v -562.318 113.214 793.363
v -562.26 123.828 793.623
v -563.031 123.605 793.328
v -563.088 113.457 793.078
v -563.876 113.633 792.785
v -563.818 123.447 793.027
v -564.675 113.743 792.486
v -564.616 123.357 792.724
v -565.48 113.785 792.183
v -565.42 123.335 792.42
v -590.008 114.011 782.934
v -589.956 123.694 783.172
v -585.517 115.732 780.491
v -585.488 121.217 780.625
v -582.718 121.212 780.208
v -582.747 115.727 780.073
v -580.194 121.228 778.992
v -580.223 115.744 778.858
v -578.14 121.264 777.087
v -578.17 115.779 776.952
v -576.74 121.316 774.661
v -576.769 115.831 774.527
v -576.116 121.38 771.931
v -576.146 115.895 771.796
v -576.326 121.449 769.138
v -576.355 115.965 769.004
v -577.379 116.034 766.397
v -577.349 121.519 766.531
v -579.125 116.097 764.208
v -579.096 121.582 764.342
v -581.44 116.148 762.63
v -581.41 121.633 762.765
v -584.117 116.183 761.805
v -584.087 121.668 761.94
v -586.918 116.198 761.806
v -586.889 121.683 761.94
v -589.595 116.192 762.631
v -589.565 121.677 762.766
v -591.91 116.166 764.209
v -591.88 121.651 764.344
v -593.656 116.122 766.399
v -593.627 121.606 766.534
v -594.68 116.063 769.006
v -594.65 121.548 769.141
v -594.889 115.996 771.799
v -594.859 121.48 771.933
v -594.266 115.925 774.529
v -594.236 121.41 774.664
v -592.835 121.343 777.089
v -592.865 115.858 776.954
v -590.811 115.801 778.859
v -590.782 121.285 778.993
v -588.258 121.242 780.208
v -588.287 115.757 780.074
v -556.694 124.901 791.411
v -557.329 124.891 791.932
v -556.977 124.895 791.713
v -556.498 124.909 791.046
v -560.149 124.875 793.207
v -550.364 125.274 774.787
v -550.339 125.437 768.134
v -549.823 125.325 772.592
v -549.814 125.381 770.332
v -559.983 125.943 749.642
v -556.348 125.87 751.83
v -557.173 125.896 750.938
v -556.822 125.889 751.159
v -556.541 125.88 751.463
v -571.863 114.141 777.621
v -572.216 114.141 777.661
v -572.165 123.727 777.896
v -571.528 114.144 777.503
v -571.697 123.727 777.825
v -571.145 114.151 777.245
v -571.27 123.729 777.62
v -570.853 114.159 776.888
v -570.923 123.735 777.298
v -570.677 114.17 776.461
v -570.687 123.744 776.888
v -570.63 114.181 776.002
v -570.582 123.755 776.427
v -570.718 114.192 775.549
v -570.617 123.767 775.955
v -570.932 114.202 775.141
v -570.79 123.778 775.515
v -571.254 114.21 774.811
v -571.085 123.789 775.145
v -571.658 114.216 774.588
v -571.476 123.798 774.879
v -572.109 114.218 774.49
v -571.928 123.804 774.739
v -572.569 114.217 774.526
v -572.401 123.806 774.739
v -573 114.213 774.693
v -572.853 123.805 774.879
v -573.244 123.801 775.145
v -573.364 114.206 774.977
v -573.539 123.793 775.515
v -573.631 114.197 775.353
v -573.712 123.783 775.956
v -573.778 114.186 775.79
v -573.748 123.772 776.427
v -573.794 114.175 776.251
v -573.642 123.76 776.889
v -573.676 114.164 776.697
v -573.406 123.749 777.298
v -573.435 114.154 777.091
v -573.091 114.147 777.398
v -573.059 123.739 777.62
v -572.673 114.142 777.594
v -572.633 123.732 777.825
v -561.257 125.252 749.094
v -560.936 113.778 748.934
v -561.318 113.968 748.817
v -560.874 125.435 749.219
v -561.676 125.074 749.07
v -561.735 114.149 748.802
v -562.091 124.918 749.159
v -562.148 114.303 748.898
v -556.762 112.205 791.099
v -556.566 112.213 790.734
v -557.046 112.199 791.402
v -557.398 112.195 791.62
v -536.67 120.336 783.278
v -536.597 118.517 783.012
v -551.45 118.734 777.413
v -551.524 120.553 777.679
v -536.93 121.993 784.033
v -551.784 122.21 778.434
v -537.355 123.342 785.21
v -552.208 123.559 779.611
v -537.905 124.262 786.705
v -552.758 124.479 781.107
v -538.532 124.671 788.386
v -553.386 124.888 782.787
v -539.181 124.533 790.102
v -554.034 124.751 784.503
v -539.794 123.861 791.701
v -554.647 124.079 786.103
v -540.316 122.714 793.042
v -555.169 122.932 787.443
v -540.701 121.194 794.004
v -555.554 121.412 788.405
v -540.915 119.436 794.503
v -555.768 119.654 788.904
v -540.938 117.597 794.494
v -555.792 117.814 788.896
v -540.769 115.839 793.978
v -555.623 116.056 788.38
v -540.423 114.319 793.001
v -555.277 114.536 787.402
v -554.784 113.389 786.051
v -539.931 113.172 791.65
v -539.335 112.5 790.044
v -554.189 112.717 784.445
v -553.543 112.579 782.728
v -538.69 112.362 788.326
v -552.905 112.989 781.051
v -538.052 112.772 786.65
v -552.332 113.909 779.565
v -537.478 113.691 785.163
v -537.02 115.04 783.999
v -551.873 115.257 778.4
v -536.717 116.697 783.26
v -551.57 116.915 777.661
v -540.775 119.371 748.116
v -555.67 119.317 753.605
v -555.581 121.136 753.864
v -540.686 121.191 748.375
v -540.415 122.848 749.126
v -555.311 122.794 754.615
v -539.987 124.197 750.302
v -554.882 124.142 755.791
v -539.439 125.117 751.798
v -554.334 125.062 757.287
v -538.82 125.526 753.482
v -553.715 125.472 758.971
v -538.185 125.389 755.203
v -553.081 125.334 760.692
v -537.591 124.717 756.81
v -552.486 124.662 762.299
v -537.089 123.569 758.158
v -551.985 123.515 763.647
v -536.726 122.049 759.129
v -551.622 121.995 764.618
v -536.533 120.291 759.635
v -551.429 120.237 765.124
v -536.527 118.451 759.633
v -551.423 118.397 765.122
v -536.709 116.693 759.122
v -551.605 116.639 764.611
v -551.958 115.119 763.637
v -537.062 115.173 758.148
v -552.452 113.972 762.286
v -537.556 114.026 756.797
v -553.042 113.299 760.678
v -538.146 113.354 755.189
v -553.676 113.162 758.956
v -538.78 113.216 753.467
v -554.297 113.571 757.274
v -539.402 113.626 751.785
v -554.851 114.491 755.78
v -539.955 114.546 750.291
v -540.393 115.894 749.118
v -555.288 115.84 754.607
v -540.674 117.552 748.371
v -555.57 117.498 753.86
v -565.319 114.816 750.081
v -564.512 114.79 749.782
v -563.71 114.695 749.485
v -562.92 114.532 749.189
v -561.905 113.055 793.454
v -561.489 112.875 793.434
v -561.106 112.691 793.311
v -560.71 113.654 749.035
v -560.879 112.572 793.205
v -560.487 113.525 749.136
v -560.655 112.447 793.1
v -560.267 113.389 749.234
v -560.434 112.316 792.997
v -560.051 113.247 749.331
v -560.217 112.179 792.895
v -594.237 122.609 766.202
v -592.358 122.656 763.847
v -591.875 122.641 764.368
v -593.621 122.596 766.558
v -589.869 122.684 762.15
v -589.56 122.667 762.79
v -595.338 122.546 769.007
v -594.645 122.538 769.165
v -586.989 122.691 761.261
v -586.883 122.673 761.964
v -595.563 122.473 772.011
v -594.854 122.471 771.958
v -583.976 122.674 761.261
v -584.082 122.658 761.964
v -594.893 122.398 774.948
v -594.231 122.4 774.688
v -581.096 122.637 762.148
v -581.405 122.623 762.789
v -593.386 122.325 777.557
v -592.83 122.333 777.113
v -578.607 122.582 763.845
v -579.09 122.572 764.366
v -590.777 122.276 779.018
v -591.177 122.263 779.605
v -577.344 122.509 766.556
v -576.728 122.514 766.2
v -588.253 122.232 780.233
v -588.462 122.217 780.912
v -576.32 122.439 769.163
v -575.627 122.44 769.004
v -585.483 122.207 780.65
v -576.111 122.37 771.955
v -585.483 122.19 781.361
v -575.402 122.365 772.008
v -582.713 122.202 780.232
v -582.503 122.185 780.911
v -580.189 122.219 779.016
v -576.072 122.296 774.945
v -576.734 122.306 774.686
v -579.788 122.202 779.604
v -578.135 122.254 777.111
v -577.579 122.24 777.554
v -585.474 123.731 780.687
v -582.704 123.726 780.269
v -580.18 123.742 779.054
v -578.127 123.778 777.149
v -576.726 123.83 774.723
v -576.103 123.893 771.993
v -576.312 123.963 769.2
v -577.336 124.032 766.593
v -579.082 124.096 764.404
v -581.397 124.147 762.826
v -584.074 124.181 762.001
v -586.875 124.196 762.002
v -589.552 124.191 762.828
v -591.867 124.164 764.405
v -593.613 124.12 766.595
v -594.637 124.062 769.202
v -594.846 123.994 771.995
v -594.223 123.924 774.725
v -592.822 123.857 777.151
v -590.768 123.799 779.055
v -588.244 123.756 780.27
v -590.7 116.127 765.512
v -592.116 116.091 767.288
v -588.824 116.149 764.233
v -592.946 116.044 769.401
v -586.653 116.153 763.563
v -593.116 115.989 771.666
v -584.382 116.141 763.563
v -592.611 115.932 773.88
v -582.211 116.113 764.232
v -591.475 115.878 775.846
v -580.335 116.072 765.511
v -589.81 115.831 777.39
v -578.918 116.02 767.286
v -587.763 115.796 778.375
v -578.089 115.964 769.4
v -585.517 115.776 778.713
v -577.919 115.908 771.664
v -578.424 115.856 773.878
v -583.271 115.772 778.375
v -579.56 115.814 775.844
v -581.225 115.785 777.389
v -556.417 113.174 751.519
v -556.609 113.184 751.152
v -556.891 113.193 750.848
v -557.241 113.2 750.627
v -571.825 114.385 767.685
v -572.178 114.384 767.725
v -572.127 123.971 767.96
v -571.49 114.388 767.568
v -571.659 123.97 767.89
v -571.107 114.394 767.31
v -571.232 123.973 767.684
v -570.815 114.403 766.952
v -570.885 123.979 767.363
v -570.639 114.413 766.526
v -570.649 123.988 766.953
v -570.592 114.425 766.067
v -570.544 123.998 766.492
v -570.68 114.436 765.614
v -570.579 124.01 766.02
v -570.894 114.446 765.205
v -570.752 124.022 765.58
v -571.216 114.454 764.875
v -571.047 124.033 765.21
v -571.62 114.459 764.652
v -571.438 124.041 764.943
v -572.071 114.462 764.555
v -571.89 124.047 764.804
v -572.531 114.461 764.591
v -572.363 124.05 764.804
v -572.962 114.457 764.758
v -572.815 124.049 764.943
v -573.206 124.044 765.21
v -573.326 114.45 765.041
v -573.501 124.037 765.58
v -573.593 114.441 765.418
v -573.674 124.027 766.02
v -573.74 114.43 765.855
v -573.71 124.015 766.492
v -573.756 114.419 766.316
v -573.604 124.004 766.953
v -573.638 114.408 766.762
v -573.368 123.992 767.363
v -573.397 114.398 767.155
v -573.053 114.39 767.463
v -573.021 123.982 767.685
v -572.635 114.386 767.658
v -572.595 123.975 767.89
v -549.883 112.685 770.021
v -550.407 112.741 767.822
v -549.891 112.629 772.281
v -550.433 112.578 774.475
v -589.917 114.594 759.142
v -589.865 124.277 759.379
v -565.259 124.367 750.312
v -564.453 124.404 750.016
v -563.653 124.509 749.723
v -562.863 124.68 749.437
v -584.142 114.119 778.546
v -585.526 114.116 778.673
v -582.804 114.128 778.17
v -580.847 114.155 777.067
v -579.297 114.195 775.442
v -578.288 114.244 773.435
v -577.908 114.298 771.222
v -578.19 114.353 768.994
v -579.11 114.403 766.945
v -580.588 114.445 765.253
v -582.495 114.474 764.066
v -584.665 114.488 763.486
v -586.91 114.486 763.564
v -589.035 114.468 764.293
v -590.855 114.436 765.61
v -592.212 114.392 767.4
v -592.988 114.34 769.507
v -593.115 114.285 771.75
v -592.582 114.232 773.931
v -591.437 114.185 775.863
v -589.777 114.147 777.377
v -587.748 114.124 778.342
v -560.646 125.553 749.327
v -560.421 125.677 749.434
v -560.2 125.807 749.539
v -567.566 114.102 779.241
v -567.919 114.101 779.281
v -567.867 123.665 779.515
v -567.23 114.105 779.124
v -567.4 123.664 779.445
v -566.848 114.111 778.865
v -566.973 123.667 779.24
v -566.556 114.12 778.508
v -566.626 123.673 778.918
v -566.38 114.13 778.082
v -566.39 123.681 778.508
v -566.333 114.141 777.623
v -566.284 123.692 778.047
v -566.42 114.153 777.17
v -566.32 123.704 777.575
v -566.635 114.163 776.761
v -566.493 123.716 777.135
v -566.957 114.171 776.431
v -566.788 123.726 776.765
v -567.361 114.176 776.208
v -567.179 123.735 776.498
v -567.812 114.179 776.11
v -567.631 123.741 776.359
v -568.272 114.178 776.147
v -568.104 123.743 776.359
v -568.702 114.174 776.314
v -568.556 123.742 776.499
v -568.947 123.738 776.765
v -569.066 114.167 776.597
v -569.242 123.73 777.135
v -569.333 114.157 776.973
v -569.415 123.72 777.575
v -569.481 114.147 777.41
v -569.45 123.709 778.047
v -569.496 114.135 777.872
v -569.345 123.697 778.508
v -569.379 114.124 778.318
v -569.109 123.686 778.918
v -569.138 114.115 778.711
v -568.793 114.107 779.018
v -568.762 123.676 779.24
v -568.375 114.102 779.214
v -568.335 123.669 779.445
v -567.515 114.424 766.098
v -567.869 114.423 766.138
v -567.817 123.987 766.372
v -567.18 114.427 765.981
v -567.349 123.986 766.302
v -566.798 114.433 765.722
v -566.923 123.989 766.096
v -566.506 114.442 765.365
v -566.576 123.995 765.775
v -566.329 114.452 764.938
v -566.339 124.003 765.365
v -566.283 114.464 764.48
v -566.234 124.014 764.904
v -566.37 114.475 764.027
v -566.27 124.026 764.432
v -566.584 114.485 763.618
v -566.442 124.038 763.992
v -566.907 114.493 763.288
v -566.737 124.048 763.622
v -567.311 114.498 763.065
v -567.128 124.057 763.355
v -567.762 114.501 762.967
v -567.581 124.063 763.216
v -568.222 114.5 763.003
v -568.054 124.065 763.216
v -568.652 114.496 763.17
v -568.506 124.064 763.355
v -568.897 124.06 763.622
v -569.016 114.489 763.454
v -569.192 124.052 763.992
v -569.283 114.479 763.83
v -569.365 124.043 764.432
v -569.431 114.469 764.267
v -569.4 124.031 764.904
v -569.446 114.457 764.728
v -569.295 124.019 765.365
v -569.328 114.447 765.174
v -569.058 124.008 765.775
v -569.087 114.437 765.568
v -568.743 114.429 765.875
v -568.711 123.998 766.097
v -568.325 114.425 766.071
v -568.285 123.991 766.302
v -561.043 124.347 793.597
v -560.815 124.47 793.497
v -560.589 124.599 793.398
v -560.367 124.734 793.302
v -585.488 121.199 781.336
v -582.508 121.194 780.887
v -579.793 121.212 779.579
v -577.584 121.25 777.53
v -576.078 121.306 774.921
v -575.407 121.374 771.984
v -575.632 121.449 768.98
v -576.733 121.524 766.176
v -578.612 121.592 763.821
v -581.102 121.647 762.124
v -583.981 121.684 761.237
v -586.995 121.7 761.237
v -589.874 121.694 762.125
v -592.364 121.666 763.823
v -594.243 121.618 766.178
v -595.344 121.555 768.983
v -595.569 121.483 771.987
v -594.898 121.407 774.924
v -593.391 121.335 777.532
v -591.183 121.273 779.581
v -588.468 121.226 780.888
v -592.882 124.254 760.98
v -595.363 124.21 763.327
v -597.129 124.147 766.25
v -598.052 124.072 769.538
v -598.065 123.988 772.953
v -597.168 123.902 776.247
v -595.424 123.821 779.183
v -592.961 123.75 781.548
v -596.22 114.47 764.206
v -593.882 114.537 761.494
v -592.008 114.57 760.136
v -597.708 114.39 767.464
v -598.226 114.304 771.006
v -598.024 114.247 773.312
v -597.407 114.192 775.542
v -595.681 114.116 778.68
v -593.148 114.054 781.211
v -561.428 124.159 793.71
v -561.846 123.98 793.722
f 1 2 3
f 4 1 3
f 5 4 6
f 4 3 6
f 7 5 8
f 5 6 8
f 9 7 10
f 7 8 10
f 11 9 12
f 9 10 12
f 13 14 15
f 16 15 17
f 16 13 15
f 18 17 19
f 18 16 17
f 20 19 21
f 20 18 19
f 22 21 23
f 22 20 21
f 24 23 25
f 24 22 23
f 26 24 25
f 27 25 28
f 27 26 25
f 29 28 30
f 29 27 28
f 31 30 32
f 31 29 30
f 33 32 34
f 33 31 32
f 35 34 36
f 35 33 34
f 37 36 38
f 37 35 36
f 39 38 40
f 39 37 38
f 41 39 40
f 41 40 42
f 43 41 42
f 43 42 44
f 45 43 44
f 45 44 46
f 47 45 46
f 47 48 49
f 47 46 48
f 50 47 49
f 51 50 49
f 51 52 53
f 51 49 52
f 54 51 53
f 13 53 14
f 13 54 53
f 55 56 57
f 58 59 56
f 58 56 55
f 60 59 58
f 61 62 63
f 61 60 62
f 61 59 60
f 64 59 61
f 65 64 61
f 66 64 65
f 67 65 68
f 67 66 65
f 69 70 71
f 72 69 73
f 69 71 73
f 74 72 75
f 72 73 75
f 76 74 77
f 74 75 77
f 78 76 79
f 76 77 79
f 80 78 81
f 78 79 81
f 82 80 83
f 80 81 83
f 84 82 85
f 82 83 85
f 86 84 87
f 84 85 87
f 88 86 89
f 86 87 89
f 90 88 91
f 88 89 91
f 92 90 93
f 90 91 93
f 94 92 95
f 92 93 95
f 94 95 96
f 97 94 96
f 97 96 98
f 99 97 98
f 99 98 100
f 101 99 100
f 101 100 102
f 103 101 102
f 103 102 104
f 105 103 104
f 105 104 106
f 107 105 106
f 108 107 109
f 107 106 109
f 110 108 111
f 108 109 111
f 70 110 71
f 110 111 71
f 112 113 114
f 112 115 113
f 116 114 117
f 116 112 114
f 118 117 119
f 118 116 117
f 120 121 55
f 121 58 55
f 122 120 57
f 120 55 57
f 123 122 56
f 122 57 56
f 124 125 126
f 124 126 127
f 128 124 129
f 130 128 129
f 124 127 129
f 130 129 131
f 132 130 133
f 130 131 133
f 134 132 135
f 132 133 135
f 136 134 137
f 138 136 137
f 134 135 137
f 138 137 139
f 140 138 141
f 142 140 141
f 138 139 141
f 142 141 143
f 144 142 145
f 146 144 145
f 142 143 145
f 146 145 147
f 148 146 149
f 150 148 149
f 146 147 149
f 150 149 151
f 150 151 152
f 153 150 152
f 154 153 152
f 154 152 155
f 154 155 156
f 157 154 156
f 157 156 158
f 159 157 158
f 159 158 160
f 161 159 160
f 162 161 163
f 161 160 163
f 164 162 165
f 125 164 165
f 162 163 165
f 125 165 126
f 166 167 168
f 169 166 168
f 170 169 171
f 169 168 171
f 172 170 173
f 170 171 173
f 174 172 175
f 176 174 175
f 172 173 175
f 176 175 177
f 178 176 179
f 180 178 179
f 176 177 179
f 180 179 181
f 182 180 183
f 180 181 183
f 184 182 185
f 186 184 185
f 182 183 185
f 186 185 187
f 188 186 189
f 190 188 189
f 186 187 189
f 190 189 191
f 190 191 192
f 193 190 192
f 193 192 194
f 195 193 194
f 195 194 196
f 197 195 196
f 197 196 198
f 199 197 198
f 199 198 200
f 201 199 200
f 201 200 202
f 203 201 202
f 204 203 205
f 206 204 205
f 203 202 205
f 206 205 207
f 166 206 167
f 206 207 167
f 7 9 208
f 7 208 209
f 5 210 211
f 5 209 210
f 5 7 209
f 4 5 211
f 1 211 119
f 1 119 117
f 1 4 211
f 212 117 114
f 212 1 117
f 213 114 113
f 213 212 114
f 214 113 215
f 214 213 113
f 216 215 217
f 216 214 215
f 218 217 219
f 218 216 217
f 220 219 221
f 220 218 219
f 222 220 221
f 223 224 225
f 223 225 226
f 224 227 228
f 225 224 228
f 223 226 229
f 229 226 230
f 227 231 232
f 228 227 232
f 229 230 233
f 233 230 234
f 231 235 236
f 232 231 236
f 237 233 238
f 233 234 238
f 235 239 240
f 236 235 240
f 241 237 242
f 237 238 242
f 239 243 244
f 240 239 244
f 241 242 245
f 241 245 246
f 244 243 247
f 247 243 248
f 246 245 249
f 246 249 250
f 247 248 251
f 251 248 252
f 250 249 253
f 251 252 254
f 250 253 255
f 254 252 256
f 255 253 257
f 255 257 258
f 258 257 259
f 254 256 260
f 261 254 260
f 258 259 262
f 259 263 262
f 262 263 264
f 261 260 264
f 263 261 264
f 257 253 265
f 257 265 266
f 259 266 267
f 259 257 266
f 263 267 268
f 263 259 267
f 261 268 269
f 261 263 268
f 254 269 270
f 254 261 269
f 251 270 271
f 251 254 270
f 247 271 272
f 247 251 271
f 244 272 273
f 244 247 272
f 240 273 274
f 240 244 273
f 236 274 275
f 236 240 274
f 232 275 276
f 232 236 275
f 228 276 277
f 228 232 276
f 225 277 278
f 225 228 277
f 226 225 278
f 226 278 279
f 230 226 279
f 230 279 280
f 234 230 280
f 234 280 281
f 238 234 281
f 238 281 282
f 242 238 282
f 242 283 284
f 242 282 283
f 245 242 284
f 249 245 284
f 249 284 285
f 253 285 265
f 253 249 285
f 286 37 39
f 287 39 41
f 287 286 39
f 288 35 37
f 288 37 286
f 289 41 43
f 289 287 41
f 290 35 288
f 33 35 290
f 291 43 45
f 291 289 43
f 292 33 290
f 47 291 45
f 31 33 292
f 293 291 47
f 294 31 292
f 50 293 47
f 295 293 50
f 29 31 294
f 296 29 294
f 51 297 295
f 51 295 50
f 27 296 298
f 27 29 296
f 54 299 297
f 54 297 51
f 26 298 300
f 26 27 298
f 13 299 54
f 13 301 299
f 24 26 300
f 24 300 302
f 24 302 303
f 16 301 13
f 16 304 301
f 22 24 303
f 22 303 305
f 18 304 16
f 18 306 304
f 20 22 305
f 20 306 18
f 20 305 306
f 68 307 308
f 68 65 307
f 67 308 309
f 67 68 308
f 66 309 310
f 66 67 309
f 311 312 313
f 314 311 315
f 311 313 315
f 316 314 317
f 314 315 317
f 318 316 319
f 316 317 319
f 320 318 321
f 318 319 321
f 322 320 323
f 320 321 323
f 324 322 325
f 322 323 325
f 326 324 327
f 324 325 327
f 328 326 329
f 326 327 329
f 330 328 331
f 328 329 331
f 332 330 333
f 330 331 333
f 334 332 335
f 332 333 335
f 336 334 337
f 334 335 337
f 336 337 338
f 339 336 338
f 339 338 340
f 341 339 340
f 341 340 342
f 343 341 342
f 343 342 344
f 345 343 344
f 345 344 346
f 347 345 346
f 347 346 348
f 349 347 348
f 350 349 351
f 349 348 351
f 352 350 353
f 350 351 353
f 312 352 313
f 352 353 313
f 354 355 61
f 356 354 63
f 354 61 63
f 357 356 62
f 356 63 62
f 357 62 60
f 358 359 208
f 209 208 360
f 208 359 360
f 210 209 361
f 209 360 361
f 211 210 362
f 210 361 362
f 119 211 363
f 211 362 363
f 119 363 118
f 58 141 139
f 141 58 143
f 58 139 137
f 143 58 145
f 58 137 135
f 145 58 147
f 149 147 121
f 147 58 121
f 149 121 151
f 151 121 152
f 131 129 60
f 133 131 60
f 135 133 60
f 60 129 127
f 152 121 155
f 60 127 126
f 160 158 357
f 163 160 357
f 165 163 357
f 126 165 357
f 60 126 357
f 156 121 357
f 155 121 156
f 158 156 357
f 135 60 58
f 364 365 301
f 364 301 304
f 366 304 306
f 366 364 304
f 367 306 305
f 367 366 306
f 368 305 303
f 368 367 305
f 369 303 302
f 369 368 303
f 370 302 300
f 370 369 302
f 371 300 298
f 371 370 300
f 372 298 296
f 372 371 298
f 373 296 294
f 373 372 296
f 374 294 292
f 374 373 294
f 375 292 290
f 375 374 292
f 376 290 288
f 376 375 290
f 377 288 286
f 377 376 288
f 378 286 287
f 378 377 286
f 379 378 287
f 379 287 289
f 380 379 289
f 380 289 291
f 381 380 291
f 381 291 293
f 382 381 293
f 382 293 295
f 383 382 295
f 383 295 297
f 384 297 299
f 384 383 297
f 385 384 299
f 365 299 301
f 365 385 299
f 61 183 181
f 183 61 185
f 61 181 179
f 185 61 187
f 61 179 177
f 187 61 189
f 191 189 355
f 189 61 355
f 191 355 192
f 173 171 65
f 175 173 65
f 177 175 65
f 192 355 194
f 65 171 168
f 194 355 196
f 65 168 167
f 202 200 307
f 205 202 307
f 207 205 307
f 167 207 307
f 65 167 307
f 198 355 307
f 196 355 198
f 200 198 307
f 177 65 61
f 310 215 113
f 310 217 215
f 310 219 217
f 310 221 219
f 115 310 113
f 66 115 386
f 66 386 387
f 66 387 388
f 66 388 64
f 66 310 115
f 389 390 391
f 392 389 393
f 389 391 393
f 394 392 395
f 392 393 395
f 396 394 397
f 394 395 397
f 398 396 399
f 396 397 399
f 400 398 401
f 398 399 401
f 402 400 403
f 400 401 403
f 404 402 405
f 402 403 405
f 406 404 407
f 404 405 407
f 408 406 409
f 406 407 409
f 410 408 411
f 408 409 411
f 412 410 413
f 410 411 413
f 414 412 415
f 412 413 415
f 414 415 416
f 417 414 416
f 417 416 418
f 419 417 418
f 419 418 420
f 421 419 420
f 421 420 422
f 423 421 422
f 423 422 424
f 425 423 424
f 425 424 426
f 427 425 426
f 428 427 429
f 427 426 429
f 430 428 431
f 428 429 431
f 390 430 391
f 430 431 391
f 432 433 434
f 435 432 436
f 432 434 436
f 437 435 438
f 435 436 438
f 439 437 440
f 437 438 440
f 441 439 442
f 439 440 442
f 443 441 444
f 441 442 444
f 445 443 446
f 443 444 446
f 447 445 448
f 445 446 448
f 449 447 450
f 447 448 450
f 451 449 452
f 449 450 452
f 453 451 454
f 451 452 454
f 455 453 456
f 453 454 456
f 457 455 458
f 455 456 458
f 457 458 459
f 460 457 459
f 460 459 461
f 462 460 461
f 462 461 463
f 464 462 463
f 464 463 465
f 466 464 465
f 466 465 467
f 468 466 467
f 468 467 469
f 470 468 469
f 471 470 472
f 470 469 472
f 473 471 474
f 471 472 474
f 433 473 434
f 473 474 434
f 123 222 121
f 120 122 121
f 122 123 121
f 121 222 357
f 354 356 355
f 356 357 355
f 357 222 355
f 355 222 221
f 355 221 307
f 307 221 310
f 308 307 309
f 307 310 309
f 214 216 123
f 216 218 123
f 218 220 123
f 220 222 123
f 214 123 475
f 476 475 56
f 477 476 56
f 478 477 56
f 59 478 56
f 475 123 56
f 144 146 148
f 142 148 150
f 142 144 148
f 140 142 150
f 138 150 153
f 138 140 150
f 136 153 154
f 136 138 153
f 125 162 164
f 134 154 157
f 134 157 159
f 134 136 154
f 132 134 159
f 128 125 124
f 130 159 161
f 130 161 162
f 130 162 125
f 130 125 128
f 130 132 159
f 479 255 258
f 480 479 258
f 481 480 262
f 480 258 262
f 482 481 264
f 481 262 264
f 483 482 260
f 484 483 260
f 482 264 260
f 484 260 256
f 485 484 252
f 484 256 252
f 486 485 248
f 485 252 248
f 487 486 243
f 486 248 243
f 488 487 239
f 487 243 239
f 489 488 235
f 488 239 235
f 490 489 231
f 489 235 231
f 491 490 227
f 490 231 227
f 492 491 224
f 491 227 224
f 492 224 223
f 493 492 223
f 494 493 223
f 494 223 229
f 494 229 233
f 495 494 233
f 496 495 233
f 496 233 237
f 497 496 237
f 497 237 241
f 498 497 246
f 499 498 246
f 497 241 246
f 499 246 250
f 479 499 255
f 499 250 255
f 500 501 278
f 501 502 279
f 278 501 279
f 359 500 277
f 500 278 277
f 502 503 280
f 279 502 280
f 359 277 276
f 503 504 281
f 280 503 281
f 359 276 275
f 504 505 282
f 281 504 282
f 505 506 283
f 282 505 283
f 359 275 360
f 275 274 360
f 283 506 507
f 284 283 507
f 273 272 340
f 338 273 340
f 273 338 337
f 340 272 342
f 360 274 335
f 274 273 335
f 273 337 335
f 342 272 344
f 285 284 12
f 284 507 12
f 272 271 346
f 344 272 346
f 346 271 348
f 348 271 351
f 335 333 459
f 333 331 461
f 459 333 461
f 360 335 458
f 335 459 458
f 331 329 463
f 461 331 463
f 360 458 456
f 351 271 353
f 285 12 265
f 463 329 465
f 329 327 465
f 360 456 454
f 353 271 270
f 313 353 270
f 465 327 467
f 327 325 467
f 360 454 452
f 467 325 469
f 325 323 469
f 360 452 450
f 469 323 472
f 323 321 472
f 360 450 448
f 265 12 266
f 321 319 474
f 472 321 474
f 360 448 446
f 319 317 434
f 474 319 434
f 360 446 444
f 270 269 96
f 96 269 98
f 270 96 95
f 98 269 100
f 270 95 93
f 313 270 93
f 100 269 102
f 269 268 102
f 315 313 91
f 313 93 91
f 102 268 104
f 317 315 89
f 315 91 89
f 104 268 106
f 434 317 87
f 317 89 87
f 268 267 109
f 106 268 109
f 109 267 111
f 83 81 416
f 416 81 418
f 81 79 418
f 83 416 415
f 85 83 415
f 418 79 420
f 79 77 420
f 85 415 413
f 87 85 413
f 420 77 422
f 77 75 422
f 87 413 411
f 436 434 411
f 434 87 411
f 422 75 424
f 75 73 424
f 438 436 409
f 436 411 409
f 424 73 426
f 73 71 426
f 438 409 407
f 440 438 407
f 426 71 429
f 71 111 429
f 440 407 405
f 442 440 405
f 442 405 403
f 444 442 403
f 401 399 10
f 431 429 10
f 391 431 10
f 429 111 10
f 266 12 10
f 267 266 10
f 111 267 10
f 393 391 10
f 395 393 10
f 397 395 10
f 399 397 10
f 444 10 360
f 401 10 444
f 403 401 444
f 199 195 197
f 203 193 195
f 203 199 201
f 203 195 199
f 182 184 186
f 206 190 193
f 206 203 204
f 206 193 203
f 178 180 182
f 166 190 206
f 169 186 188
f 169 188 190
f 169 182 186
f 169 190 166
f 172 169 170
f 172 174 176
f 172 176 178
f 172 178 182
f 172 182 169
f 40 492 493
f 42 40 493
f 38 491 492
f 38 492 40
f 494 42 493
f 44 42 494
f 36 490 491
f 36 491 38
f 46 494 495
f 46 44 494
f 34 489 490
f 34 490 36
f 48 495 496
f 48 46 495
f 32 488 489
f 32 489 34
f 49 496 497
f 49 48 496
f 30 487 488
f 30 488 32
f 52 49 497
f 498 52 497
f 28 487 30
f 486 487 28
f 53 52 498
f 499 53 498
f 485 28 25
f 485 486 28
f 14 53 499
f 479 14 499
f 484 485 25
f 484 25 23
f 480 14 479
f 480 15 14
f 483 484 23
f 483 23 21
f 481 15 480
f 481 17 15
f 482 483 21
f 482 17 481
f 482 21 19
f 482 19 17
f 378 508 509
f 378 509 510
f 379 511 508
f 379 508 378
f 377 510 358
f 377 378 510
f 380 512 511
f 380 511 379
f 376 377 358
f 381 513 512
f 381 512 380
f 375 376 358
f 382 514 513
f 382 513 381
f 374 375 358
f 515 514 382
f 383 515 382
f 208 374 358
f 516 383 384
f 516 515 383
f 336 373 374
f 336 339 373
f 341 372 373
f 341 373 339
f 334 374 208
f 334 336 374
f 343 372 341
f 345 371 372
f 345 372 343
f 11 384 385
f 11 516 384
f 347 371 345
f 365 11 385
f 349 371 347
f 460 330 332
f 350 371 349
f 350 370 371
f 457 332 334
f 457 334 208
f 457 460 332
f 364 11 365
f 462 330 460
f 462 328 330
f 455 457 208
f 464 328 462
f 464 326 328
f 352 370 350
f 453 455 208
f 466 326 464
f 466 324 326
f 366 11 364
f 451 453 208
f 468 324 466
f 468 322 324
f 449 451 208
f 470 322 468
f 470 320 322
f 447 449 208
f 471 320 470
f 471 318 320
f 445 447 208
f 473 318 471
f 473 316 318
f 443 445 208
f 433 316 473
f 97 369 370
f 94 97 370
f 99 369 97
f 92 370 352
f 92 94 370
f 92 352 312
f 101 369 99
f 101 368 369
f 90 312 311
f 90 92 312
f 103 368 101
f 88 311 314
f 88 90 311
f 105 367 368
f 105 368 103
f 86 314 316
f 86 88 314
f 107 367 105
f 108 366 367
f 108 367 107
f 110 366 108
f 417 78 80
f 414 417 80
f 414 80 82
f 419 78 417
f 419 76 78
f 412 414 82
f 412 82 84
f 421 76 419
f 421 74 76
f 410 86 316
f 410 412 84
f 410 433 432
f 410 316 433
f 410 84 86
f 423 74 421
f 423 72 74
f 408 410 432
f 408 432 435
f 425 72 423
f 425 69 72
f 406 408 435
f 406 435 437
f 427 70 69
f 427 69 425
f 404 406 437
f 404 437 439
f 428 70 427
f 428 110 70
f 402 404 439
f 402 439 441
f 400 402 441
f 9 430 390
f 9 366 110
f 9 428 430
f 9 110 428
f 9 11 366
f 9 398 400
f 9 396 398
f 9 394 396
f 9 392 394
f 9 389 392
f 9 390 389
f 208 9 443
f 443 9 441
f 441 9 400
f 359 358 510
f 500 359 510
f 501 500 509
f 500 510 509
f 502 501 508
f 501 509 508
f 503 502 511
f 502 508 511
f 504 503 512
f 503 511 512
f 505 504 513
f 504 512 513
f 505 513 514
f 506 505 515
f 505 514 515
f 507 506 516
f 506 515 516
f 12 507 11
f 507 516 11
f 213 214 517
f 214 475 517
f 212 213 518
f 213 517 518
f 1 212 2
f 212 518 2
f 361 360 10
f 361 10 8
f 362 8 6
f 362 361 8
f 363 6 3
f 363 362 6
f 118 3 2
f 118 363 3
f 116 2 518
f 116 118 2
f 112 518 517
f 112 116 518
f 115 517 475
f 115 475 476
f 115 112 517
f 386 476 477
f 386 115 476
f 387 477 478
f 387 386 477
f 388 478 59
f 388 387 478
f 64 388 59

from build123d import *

# Parameters (mm, degrees)
WISHBONE_END_BASE_BODY_DEPTH           = 6.35
WISHBONE_END_BASE_BODY_DEPTH_BACK      = 6.35
WISHBONE_END_BODY_SKETCH_R             = 7.6199999999999655
SPHERICAL_BEARING_BORE_HOLE_DEPTH      = 994.1778562213065
SPHERICAL_BEARING_BORE_HOLE_DEPTH_BACK = 3.2385
SKETCH37_R                             = 9.398000000000074
GROOVE_START                           = 3.2385
SKETCH38_R                             = 10.10920000000004
GROOVE_FOR_99142A390_DEPTH             = 0.9905999999999999
SKETCH39_R                             = 6.172199999999972
LEADING_ARM_TUBE_INSERT_DEPTH          = 15.875
SKETCH40_R                             = 6.172199999999972
TRAILING_ARM_TUBE_INSERT_DEPTH         = 15.875
CUT_EXTRUDE3_DEPTH                     = 614.178901904527
CUT_EXTRUDE3_DEPTH_BACK                = 614.178901904527
FILLET1_R                              = 9.525
CHAMFER1_SIZE                          = 3.8099999999999996
FILLET2_R                              = 9.525
FILLET3_R                              = 1.5875
SKETCH42_R                             = 1.587499999999916
SKETCH42_R_2                           = 1.5874999999997772
SKETCH42_R_3                           = 1.5875000000002346
MACHINING_ALIGNMENT_HOLES_DEPTH        = 993.6874865506448


with BuildPart() as part:
    # wishbone end body sketch → wishbone end base body (new, two sides: drawn at the far end of the back side and taken through both)
    with BuildSketch(Plane(origin=(0.7258862866452951, 134.87955098448836, 3.3083663449025464), x_dir=(0.999985527474362, -0.005378423373816958, -0.00013192359218796315), z_dir=(0.005380041061385716, 0.9996848486991856, 0.024520571760546048)).offset(-WISHBONE_END_BASE_BODY_DEPTH_BACK)):
        with BuildLine():
            Line((-590.7162762655777, -779.9030929511134), (-558.8429156016132, -791.9248886865561))
            Line((-558.8429156016132, -791.9248886865561), (-549.8791042276648, -768.1591552526331))
            Line((-549.8791042276648, -768.1591552526331), (-558.6610183956265, -744.3256078132241))
            Line((-558.6610183956265, -744.3256078132241), (-590.6253276625844, -756.1034525144474))
            ThreePointArc((-590.6253276625844, -756.1034525144474), (-598.9342778486073, -767.9716944579083), (-590.7162762655777, -779.9030929511134))
        make_face()
        with Locations(Location((-586.2343705786035, -768.0202262341521, 0), (0, 0, 270))):
            Circle(WISHBONE_END_BODY_SKETCH_R, mode=Mode.SUBTRACT)
    extrude(amount=WISHBONE_END_BASE_BODY_DEPTH + WISHBONE_END_BASE_BODY_DEPTH_BACK)

    # Sketch37 → spherical bearing bore hole (cut, two sides: drawn at the far end of the back side and taken through both)
    with BuildSketch(Plane(origin=(0.7258862866452951, 134.87955098448836, 3.3083663449025464), x_dir=(0.999985527474362, -0.005378423373816958, -0.00013192359218796315), z_dir=(0.005380041061385716, 0.9996848486991856, 0.024520571760546048)).offset(-SPHERICAL_BEARING_BORE_HOLE_DEPTH_BACK)):
        with Locations(Location((-586.2343705786035, -768.0202262341521, 0), (0, 0, 270))):
            Circle(SKETCH37_R)
    extrude(amount=SPHERICAL_BEARING_BORE_HOLE_DEPTH + SPHERICAL_BEARING_BORE_HOLE_DEPTH_BACK, mode=Mode.SUBTRACT)

    # Sketch38 → groove for 99142A390 (cut)
    with BuildSketch(Plane(origin=(0.7258862866452951, 134.87955098448836, 3.3083663449025464), x_dir=(0.999985527474362, -0.005378423373816958, -0.00013192359218796315), z_dir=(0.005380041061385716, 0.9996848486991856, 0.024520571760546048)).offset(GROOVE_START)):
        with Locations(Location((-586.2343705786035, -768.0202262341521, 0), (0, 0, 270))):
            Circle(SKETCH38_R)
    extrude(amount=-GROOVE_FOR_99142A390_DEPTH, mode=Mode.SUBTRACT)

    # Sketch39 → leading arm tube insert (add)
    with BuildSketch(Plane(origin=(-227.74660652476513, 3.3313146383369725, -85.84541568022186), x_dir=(0.3526386884421761, -0.005158146778901092, -0.9357453440630037), z_dir=(0.9356452552652121, -0.013685950287986396, 0.3526764112673413))):
        with Locations(Location((-928.7082188867262, 110.62389056036547, 0), (0, 0, 0.295569033))):
            Circle(SKETCH39_R)
    extrude(amount=LEADING_ARM_TUBE_INSERT_DEPTH)

    # Sketch40 → trailing arm tube insert (add)
    with BuildSketch(Plane(origin=(-733.3441053167152, -2.681708402002071, 270.23369281713326), x_dir=(-0.3457621685662157, -0.0012643904898342719, -0.938321333075763), z_dir=(0.9383150593615196, 0.003431250568691938, -0.34576448038357405))):
        with Locations(Location((-521.3169196855705, 121.34025761798294, 0), (0, 0, 0.072444684))):
            Circle(SKETCH40_R)
    extrude(amount=TRAILING_ARM_TUBE_INSERT_DEPTH)

    # Sketch41 → Cut-Extrude3 (cut, two sides: drawn at the far end of the back side and taken through both)
    with BuildSketch(Plane(origin=(-2.943409073321915, -18.871393740527775, 770.0180176181074), x_dir=(-0.9999926986368375, 9.362436458525497e-05, -0.003820197310804283), z_dir=(0.0038213443989151604, 0.024500194493421494, -0.9996925216269098)).offset(-CUT_EXTRUDE3_DEPTH_BACK)):
        Polygon((595.2948241213879, 131.77671300237452), (595.2873859667309, 133.15922897461502), (557.1948241213879, 133.159228974615), (557.1948241213879, 131.571728974615), align=None)
        Polygon((595.2350378549631, 142.88907514922224), (557.126497101028, 142.68404517085534), (557.126497101028, 144.27154517085532), (595.226497101028, 144.47652919861486), align=None)
    extrude(amount=CUT_EXTRUDE3_DEPTH + CUT_EXTRUDE3_DEPTH_BACK, mode=Mode.SUBTRACT)

    # Fillet1
    # the kernel refuses this fillet: 9.525 mm, written as the material it adds along each edge
    with BuildSketch(Plane(origin=(-560.2724336268298, 113.41353360474875, 807.3240128802753), x_dir=(-3.2942809255927247e-12, -0.9996998207983545, -0.02450037337955774), z_dir=(0.0038213443989151483, 0.024500194493421494, -0.9996925216269098))) as fillet1_piece_1_section:
        with BuildLine():
            CenterArc((9.525000000017343, 5.265141854675068), FILLET1_R, 179.99999999981125, 33.55730976200755)
            Line((1.734599e-11, 5.265141854706447), (-0.19049999998265063, 5.265141854707075))
            Line((-0.19049999998265063, 5.265141854707075), (-0.1904999999999994, 6.2734e-13))
            Line((-0.1904999999999994, 6.2734e-13), (-6.2619e-13, -0.19050000000003728))
            ThreePointArc((-6.2619e-13, -0.19050000000003728), (0.7937500000033896, -0.19050000000265227), (1.4287500000078057, -0.10530283709351278))
            Line((1.4287500000078057, -0.10530283709351278), (1.5875000000079915, 0))
        make_face()
    fillet1_piece_1 = extrude(amount=72.36652834652159, mode=Mode.PRIVATE)
    fillet1_piece_1 = split(fillet1_piece_1, bisect_by=Plane(origin=(-569.064048669562, 113.51391058502266, 790.8244812436348), z_dir=(0.35290085216371403, 0.021045143050144578, -0.9354240164204272)), keep=Keep.TOP, mode=Mode.PRIVATE)
    fillet1_piece_1 = split(fillet1_piece_1, bisect_by=Plane(origin=(-568.9133352872509, 114.4801954294582, 751.396723516925), z_dir=(0.34573964848360106, -0.024868248849107495, 0.9380008878810375)), keep=Keep.TOP, mode=Mode.PRIVATE)
    add(fillet1_piece_1)
    with BuildSketch(Plane(origin=(-559.9274640787987, 124.70915530829745, 735.1857328131279), x_dir=(-0.9999782260055279, 0.005472088364658121, -0.0036883280448706773), z_dir=(-0.0038213443989151483, -0.024500194493421494, 0.9996925216269098))) as fillet1_piece_2_section:
        with BuildLine():
            CenterArc((5.273648095245833, -9.525000000000006), FILLET1_R, 89.99999999999999, 33.55705973982701)
            Line((0.00854087754486855, -1.5874770245300465), (-0.09676126680913032, -1.4287265650206478))
            ThreePointArc((-0.09676126680913032, -1.4287265650206478), (-0.18622680417126483, -0.794763417570426), (-0.19049724294364254, -0.0010249053053967))
            Line((-0.19049724294364254, -0.0010249053053967), (-2.955e-14, 0.19049999999999728))
            Line((-2.955e-14, 0.19049999999999728), (5.2736480952458065, 0.1904999999999973))
            Line((5.2736480952458065, 0.1904999999999973), (5.273648095245836, 0))
        make_face()
    fillet1_piece_2 = extrude(amount=72.42179621801027, mode=Mode.PRIVATE)
    fillet1_piece_2 = split(fillet1_piece_2, bisect_by=Plane(origin=(-569.0001389759076, 123.73065535763696, 791.0784480398987), z_dir=(0.35290085216371403, 0.021045143050144578, -0.9354240164204272)), keep=Keep.TOP, mode=Mode.PRIVATE)
    fillet1_piece_2 = split(fillet1_piece_2, bisect_by=Plane(origin=(-568.8494001928565, 124.697103483473, 751.6440278829348), z_dir=(0.34573964848360106, -0.024868248849107495, 0.9380008878810375)), keep=Keep.TOP, mode=Mode.PRIVATE)
    add(fillet1_piece_2)

    # Chamfer1
    chamfer1_edges = [part.edges().sort_by_distance(p)[0] for p in [
        (-558.1089414465442, 118.46651268395277, 795.0688611446163),
        (-557.9270468730695, 119.63271283819378, 747.4838685753589),
    ]]
    chamfer(chamfer1_edges, length=CHAMFER1_SIZE)

    # Fillet2
    fillet2_edges = [part.edges().sort_by_distance(p)[0] for p in [
        (-549.1452598015858, 119.00105931742645, 771.3090911275373),
    ]]
    fillet(fillet2_edges, radius=FILLET2_R)

    # Fillet3
    fillet3_edges = [part.edges().sort_by_distance(p)[0] for p in [
        (-561.5020537397296, 119.61471747963421, 748.801110510107),
        (-561.6737763595983, 118.51373386067205, 793.7250432821822),
        (-556.764389199803, 118.54669467897371, 791.5048956420608),
        (-556.6097788123484, 119.53796481007879, 751.0576519581815),
    ]]
    fillet(fillet3_edges, radius=FILLET3_R)

    # Sketch42 → machining alignment holes (cut, through all)
    with BuildSketch(Plane(origin=(0.7515088558077796, 139.6405730446522, 3.42514613128373), x_dir=(0.9999855274743621, -0.005378423373807206, -0.0001319235921877165), z_dir=(0.005380041061375963, 0.9996848486991857, 0.024520571760544684))):
        with Locations(Location((-568.57694591022, -761.514019457373, 0), (0, 0, 270))):
            Circle(SKETCH42_R)
        with Locations(Location((-568.6271868865741, -774.6611941588587, 0), (0, 0, 270))):
            Circle(SKETCH42_R)
        with Locations(Location((-572.9243944265849, -773.0404001728256, 0), (0, 0, 270))):
            Circle(SKETCH42_R_2)
        with Locations(Location((-572.8864152580355, -763.1019236507452, 0), (0, 0, 270))):
            Circle(SKETCH42_R_3)
    extrude(amount=-MACHINING_ALIGNMENT_HOLES_DEPTH, mode=Mode.SUBTRACT)


solid = part.part
